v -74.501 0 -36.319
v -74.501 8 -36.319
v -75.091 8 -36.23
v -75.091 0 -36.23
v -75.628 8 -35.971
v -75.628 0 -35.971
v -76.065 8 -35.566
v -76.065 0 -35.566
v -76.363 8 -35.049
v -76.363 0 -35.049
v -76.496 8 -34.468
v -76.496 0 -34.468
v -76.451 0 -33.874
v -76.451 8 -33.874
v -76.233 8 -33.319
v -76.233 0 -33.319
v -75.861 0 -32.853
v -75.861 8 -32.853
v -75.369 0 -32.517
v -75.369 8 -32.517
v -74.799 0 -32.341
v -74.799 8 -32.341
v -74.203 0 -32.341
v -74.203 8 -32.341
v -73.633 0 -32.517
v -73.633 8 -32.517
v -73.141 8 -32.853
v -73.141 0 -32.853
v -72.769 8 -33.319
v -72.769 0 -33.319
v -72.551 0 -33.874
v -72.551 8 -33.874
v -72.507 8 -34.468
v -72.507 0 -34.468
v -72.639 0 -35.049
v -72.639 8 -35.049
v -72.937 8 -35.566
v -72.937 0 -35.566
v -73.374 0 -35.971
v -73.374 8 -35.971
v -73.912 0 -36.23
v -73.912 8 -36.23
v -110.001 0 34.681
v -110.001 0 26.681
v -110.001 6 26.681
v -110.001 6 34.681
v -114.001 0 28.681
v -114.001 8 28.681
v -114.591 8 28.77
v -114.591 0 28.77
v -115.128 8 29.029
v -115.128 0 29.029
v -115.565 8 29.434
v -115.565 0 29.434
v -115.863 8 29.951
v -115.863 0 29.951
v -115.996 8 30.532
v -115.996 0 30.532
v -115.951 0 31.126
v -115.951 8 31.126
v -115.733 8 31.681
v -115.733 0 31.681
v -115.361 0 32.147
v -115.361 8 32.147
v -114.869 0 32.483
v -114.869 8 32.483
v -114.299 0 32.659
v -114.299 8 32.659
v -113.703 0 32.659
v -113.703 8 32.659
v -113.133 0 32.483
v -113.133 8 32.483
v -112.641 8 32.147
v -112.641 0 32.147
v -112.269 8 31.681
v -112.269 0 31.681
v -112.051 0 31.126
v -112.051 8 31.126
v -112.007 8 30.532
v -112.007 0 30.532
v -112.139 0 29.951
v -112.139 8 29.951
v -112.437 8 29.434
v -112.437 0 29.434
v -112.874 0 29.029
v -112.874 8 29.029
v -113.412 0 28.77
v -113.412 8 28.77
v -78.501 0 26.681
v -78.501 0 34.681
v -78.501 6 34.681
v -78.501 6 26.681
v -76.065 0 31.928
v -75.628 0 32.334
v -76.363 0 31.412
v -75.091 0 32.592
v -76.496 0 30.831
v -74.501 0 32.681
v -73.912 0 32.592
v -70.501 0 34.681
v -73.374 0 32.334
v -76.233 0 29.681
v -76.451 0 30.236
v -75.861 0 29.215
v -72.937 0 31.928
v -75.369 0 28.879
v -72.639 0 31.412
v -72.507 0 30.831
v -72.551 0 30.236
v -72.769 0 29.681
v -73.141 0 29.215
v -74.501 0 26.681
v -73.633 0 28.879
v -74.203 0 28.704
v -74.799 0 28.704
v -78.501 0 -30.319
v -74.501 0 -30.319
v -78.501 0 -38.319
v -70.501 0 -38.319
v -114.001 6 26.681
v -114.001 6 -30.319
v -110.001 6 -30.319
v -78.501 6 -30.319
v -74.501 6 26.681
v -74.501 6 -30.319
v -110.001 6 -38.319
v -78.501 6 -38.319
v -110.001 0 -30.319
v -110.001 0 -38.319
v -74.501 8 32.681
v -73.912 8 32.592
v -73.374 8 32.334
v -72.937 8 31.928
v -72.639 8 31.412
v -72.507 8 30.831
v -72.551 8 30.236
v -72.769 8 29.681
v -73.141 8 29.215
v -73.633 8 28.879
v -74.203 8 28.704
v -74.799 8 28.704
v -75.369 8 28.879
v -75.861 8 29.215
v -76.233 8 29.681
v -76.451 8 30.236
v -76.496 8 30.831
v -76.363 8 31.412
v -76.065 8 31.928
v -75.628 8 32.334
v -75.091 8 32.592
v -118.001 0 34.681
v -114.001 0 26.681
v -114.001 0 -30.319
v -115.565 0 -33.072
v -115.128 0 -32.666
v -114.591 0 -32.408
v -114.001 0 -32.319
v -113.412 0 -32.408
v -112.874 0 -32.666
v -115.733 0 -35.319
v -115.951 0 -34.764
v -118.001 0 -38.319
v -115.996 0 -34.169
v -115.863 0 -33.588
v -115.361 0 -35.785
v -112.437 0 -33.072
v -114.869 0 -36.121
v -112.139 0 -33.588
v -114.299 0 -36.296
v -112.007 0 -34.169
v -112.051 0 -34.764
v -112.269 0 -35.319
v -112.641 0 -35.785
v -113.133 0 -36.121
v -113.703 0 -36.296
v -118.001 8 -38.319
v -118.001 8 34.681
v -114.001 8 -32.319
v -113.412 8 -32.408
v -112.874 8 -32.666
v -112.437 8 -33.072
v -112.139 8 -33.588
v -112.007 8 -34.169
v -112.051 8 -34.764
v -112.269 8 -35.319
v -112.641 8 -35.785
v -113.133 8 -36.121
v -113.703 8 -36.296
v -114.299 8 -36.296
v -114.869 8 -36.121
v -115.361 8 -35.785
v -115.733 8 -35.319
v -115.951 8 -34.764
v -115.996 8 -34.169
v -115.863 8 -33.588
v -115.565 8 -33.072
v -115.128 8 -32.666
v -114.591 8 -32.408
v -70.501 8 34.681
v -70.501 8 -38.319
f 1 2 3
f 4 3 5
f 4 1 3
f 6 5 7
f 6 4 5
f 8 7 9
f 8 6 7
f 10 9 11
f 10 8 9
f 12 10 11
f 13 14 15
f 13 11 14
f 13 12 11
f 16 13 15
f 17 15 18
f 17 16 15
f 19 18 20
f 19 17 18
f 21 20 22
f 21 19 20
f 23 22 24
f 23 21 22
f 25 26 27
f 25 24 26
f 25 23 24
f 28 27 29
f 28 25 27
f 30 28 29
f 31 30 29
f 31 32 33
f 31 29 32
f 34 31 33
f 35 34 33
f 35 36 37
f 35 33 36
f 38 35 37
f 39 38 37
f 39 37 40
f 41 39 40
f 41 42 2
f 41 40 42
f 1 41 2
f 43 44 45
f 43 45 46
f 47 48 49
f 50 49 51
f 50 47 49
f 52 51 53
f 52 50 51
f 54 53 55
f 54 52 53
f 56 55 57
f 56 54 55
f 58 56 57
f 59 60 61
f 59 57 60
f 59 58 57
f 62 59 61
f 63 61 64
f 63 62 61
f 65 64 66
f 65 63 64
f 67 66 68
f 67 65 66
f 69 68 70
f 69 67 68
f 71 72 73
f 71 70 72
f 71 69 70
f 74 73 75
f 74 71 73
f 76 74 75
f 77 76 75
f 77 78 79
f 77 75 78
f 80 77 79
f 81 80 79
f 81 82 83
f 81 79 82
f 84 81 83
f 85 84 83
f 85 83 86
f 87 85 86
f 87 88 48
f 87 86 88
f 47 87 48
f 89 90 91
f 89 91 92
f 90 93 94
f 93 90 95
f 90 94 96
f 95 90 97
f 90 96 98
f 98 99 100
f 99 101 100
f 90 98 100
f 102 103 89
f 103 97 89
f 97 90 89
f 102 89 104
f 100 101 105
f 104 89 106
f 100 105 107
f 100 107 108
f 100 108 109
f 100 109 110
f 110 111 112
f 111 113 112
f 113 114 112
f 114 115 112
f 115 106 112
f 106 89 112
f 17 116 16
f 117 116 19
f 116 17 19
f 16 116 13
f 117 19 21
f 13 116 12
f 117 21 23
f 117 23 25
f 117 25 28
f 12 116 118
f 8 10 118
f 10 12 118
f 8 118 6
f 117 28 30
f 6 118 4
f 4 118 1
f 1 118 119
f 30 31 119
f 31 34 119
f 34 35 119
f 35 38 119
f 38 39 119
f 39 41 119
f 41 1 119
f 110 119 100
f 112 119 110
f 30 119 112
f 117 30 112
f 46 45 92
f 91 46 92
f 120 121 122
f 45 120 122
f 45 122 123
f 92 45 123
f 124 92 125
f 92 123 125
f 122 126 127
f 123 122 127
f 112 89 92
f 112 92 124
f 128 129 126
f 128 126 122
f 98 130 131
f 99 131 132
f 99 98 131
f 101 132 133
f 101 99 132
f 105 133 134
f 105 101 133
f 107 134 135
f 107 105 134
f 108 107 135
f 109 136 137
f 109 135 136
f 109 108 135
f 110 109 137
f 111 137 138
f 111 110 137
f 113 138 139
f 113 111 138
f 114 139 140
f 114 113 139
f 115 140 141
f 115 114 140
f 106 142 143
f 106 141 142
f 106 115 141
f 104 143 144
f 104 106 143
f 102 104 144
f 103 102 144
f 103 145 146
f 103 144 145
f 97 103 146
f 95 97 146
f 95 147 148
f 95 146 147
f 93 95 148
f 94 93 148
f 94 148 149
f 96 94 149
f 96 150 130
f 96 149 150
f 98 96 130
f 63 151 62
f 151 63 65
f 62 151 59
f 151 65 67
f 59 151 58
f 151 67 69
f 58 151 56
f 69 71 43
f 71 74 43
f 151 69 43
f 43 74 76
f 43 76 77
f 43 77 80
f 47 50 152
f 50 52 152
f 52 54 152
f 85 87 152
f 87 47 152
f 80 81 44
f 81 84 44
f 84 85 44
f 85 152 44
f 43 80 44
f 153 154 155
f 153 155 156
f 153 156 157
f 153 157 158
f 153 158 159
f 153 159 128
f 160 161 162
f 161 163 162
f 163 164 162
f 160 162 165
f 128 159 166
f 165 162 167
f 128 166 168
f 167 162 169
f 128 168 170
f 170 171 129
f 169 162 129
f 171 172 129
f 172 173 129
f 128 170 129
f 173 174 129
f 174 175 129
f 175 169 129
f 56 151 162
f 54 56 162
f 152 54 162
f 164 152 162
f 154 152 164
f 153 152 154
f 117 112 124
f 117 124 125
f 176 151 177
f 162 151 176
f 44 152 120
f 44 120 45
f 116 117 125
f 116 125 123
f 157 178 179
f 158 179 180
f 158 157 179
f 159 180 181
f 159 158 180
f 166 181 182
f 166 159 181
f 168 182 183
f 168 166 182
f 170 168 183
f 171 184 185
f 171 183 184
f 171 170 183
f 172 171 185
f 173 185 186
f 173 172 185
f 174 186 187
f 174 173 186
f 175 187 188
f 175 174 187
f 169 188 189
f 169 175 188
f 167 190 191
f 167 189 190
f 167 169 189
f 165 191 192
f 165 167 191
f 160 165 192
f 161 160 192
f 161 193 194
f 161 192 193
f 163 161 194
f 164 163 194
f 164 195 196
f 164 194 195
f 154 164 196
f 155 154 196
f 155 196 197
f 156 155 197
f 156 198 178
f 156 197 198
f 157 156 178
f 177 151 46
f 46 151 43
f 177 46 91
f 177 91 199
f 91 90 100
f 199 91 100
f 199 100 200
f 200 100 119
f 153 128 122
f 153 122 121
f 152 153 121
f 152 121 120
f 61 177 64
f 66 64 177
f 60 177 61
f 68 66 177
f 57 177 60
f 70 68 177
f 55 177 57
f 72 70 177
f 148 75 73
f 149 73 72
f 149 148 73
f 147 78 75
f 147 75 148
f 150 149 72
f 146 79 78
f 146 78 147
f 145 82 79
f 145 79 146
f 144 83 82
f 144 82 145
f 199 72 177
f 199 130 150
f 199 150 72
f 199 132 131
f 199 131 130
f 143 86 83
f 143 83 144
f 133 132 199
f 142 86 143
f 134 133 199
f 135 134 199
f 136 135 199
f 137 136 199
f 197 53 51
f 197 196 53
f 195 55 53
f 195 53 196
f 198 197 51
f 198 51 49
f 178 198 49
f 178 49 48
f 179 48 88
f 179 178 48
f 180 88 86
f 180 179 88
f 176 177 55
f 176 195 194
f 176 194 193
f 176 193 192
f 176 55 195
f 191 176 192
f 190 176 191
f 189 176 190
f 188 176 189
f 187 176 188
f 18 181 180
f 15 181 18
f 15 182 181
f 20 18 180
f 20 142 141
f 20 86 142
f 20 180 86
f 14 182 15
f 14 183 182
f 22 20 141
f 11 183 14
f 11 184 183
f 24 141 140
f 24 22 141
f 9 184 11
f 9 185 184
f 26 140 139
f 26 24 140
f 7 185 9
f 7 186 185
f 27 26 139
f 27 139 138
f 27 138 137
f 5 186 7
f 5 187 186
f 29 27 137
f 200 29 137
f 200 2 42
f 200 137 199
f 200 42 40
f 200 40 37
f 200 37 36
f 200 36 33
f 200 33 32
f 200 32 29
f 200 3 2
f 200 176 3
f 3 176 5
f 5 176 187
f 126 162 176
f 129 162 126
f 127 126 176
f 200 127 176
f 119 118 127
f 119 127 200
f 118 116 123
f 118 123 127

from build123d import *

# Parameters (mm, degrees)
SKETCH1_W           = 47.5
SKETCH1_H           = 73
BOSS_EXTRUDE2_DEPTH = 8
CUT_EXTRUDE7_DEPTH  = 6
SKETCH1_9_R         = 2
CUT_EXTRUDE10_DEPTH = 125.324529963


with BuildPart() as part:
    # Sketch1 → Boss-Extrude2 (new body)
    with BuildSketch(Plane(origin=(0, 0, 0), x_dir=(1, 0, 0), z_dir=(0, 1, 0))):
        with Locations((-94.251130157, 1.818690378)):
            Rectangle(SKETCH1_W, SKETCH1_H)
    extrude(amount=BOSS_EXTRUDE2_DEPTH)

    # Sketch1<8> → Cut-Extrude7 (cut)
    with BuildSketch(Plane(origin=(0, 0, 0), x_dir=(1, 0, 0), z_dir=(0, 1, 0))):
        Polygon((-110.001130157, 38.318690378), (-110.001130157, 30.318690378), (-114.001130157, 30.318690378), (-114.001130157, -26.681309622), (-110.001130157, -26.681309622), (-110.001130157, -34.681309622), (-78.501130157, -34.681309622), (-78.501130157, -26.681309622), (-74.501130157, -26.681309622), (-74.501130157, 30.318690378), (-78.501130157, 30.318690378), (-78.501130157, 38.318690378), align=None)
    extrude(amount=CUT_EXTRUDE7_DEPTH, mode=Mode.SUBTRACT)

    # Sketch1<9> → Cut-Extrude10 (cut, through all)
    with BuildSketch(Plane(origin=(0, 0, 0), x_dir=(1, 0, 0), z_dir=(0, 1, 0))):
        with Locations((-114.001130157, 34.318690378)):
            Circle(SKETCH1_9_R)
        with Locations((-74.501130157, 34.318690378)):
            Circle(SKETCH1_9_R)
        with Locations((-114.001130157, -30.681309622)):
            Circle(SKETCH1_9_R)
        with Locations((-74.501130157, -30.681309622)):
            Circle(SKETCH1_9_R)
    extrude(amount=CUT_EXTRUDE10_DEPTH, mode=Mode.SUBTRACT)


solid = part.part
